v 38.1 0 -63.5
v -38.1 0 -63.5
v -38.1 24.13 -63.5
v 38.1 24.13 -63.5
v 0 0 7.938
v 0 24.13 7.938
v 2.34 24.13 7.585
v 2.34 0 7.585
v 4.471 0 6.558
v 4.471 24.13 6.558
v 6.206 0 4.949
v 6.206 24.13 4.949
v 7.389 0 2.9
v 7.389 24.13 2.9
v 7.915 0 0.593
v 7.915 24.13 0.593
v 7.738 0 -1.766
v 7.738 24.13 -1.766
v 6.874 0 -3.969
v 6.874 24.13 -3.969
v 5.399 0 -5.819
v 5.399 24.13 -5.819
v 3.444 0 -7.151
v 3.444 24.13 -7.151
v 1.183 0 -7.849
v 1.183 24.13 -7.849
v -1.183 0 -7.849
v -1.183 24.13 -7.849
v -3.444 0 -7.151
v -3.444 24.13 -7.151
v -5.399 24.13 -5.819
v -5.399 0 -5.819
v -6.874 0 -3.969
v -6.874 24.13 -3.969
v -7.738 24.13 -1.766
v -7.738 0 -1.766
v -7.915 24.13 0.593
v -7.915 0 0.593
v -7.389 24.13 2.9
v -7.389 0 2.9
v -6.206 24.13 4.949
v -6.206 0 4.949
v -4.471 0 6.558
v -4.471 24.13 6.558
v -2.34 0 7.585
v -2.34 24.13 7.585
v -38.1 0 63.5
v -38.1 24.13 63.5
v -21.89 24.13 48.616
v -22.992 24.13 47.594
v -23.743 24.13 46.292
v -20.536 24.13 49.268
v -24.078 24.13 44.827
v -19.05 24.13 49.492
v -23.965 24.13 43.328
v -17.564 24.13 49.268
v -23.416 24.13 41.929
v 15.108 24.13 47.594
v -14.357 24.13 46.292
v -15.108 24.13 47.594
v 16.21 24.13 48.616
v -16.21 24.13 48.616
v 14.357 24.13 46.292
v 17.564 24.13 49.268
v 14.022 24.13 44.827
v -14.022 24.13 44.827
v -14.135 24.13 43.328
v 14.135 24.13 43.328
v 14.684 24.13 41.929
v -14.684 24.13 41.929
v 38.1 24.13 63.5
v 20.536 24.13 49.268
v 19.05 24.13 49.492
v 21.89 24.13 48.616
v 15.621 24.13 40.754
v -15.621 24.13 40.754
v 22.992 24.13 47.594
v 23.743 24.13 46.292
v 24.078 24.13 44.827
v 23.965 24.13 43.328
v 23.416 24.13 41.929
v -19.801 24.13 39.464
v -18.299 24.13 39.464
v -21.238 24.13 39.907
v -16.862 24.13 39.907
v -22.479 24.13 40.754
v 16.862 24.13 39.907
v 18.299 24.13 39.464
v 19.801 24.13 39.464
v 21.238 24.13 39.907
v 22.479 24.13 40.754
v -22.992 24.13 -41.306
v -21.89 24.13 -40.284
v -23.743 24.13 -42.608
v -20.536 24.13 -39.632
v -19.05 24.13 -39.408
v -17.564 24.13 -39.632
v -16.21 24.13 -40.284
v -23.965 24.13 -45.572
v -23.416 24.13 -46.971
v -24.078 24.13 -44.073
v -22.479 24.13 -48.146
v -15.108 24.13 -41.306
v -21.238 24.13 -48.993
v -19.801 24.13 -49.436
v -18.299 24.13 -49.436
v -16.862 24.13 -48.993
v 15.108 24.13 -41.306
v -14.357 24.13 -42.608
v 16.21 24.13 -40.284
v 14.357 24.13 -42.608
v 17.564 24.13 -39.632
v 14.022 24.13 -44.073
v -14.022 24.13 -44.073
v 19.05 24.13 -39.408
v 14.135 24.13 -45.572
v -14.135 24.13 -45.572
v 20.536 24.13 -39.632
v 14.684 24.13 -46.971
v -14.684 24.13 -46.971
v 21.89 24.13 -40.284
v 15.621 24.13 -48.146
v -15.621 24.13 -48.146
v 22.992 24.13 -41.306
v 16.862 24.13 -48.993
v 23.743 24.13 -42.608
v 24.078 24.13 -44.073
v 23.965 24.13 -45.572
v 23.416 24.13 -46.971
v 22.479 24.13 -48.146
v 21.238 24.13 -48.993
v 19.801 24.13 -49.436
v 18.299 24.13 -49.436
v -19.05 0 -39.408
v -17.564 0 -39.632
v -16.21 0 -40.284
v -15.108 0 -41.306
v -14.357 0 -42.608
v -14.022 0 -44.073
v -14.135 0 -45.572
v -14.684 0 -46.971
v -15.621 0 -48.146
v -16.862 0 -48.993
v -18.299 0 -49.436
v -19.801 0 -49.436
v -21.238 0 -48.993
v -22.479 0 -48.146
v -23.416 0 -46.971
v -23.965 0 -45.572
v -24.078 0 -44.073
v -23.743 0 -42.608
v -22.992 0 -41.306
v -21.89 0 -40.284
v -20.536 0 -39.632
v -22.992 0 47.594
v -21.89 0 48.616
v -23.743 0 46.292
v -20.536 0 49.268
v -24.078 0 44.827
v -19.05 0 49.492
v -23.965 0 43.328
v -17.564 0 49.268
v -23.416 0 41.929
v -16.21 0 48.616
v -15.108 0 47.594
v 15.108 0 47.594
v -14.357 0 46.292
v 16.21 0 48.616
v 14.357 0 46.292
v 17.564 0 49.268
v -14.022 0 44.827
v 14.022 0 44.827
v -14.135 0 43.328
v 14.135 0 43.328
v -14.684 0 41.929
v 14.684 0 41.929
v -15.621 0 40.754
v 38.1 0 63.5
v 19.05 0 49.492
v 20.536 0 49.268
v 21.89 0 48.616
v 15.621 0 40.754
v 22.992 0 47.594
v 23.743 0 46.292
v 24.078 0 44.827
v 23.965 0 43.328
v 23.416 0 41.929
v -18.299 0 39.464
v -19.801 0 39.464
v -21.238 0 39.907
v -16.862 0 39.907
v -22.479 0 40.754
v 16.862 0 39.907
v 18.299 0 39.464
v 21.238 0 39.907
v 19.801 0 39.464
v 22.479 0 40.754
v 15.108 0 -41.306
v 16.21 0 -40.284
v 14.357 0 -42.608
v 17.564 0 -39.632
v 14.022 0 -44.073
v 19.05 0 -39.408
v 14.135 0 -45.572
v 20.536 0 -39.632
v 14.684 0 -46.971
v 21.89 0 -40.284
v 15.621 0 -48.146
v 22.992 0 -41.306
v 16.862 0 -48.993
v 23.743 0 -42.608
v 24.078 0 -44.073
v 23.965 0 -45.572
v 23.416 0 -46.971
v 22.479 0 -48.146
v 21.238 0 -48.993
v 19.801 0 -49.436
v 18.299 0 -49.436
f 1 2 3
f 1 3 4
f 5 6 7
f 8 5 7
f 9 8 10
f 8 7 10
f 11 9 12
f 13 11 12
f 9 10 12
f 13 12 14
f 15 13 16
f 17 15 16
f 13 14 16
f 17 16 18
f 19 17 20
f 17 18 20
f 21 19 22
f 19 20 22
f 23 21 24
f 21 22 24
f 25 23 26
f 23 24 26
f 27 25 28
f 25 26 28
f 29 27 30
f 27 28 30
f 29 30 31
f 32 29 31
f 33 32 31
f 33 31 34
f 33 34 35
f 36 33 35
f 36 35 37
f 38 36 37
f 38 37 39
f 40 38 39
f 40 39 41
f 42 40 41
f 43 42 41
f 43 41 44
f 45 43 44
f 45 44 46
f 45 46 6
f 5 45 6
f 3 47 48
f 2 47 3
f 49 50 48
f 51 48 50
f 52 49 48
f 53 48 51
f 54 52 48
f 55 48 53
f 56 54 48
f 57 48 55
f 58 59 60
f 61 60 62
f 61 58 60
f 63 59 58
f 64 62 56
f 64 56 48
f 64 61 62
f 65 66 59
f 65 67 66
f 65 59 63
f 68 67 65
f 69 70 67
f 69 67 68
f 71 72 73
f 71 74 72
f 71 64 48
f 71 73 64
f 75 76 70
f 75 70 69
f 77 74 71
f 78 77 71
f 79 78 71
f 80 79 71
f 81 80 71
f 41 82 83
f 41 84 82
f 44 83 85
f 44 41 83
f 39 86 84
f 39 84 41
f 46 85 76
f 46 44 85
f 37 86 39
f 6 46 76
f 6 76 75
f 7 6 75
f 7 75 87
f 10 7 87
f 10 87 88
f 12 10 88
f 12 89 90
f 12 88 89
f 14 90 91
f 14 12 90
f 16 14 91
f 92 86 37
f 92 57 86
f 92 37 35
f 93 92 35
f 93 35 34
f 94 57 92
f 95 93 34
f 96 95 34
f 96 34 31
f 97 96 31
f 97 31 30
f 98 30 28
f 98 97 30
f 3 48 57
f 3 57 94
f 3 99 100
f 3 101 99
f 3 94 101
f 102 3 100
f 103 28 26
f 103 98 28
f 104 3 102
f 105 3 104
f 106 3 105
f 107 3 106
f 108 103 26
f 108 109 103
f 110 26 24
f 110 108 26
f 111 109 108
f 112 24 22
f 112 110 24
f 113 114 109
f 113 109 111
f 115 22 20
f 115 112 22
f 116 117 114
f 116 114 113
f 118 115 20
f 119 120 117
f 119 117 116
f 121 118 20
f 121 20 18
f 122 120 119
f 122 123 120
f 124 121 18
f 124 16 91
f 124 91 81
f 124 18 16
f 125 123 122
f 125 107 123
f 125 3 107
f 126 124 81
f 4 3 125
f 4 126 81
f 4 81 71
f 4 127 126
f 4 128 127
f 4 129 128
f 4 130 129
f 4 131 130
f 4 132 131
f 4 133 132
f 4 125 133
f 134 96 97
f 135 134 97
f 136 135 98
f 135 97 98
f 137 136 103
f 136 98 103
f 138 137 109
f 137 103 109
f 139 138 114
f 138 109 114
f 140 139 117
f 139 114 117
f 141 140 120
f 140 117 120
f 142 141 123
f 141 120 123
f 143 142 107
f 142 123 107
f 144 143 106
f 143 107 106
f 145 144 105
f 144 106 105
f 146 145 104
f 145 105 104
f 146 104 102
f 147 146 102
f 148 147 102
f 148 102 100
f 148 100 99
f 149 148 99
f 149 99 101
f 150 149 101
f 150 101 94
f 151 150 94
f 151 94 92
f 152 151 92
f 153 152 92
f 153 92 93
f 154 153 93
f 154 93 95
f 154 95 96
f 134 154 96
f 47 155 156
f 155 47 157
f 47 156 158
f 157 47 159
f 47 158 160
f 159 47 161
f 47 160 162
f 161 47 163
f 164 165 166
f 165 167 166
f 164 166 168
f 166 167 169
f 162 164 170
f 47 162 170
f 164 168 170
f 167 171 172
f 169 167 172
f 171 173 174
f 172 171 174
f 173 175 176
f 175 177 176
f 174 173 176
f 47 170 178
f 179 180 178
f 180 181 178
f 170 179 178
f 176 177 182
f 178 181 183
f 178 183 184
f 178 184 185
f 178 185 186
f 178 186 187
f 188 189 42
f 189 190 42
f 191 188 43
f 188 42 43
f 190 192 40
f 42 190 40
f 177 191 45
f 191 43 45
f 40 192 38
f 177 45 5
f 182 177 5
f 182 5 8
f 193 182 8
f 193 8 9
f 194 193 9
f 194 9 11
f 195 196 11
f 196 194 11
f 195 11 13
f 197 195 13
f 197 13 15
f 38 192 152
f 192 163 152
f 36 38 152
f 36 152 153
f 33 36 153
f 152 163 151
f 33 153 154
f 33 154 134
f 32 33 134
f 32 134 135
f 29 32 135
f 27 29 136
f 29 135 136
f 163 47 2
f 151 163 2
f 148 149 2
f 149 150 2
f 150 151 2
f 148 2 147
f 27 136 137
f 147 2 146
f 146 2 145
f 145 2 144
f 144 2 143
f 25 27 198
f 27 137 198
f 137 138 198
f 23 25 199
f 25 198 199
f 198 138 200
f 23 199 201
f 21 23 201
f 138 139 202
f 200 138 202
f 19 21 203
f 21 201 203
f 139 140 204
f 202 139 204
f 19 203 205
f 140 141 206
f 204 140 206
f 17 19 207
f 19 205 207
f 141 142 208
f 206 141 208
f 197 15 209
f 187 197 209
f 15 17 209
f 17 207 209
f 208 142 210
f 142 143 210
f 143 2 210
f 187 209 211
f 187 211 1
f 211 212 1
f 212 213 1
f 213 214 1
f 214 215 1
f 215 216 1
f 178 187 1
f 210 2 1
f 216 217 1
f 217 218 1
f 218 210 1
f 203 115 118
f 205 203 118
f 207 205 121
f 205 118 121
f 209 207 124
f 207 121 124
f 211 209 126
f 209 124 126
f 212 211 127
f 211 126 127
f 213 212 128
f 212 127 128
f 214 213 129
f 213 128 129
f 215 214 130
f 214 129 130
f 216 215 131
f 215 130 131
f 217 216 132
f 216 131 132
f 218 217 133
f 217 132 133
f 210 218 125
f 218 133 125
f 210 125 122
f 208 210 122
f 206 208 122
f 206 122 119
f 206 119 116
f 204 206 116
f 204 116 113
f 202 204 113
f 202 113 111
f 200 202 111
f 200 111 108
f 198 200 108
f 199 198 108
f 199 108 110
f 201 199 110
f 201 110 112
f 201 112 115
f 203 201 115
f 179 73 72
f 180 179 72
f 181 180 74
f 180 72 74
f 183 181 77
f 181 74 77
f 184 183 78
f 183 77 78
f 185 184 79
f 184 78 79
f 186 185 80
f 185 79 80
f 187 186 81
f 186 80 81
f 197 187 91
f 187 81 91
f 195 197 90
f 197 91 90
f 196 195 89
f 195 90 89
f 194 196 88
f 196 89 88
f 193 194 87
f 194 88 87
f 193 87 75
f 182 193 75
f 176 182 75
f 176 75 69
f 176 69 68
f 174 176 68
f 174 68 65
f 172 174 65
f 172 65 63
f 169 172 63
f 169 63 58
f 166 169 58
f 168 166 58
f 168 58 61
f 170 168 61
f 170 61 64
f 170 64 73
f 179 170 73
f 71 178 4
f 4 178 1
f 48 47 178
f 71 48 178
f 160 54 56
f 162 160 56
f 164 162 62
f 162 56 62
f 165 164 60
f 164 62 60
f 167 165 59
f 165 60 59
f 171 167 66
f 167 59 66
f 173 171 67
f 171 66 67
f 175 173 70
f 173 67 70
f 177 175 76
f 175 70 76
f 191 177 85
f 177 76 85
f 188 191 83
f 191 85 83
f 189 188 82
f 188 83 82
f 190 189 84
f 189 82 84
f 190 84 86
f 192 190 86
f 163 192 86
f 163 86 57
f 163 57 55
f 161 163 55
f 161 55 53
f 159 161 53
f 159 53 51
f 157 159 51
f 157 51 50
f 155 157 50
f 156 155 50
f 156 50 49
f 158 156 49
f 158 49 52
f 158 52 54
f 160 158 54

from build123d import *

# Parameters (mm, degrees)
SKETCH1_W                    = 76.2
SKETCH1_H                    = 127
BOSS_EXTRUDE1_DEPTH          = 24.13
SKETCH2_R                    = 7.9375
F_1_2_13_THREADED_HOLE_DEPTH = 78.885280381
SKETCH3_R                    = 5.0419
F_3_8_THROUGH_HOLES_DEPTH    = 78.885280381


with BuildPart() as part:
    # Sketch1 → Boss-Extrude1 (new body)
    with BuildSketch(Plane(origin=(0, 0, 0), x_dir=(1, 0, 0), z_dir=(0, 1, 0))):
        Rectangle(SKETCH1_W, SKETCH1_H)
    extrude(amount=BOSS_EXTRUDE1_DEPTH)

    # Sketch2 → 1/2"-13 Threaded Hole (cut, through all)
    with BuildSketch(Plane(origin=(0, 24.13, 0), x_dir=(1, 0, 0), z_dir=(0, 1, 0))):
        with Locations(Location((0, 0, 0), (0, 0, 270))):
            Circle(SKETCH2_R)
    extrude(amount=-F_1_2_13_THREADED_HOLE_DEPTH, mode=Mode.SUBTRACT)

    # Sketch3 → 3/8" Through Holes (cut, through all)
    with BuildSketch(Plane(origin=(0, 24.13, 0), x_dir=(1, 0, 0), z_dir=(0, 1, 0))):
        with Locations(Location((-19.05, 44.45, 0), (0, 0, 270))):
            Circle(SKETCH3_R)
        with Locations(Location((19.05, 44.45, 0), (0, 0, 270))):
            Circle(SKETCH3_R)
        with Locations(Location((19.05, -44.45, 0), (0, 0, 270))):
            Circle(SKETCH3_R)
        with Locations(Location((-19.05, -44.45, 0), (0, 0, 270))):
            Circle(SKETCH3_R)
    extrude(amount=-F_3_8_THROUGH_HOLES_DEPTH, mode=Mode.SUBTRACT)


solid = part.part
